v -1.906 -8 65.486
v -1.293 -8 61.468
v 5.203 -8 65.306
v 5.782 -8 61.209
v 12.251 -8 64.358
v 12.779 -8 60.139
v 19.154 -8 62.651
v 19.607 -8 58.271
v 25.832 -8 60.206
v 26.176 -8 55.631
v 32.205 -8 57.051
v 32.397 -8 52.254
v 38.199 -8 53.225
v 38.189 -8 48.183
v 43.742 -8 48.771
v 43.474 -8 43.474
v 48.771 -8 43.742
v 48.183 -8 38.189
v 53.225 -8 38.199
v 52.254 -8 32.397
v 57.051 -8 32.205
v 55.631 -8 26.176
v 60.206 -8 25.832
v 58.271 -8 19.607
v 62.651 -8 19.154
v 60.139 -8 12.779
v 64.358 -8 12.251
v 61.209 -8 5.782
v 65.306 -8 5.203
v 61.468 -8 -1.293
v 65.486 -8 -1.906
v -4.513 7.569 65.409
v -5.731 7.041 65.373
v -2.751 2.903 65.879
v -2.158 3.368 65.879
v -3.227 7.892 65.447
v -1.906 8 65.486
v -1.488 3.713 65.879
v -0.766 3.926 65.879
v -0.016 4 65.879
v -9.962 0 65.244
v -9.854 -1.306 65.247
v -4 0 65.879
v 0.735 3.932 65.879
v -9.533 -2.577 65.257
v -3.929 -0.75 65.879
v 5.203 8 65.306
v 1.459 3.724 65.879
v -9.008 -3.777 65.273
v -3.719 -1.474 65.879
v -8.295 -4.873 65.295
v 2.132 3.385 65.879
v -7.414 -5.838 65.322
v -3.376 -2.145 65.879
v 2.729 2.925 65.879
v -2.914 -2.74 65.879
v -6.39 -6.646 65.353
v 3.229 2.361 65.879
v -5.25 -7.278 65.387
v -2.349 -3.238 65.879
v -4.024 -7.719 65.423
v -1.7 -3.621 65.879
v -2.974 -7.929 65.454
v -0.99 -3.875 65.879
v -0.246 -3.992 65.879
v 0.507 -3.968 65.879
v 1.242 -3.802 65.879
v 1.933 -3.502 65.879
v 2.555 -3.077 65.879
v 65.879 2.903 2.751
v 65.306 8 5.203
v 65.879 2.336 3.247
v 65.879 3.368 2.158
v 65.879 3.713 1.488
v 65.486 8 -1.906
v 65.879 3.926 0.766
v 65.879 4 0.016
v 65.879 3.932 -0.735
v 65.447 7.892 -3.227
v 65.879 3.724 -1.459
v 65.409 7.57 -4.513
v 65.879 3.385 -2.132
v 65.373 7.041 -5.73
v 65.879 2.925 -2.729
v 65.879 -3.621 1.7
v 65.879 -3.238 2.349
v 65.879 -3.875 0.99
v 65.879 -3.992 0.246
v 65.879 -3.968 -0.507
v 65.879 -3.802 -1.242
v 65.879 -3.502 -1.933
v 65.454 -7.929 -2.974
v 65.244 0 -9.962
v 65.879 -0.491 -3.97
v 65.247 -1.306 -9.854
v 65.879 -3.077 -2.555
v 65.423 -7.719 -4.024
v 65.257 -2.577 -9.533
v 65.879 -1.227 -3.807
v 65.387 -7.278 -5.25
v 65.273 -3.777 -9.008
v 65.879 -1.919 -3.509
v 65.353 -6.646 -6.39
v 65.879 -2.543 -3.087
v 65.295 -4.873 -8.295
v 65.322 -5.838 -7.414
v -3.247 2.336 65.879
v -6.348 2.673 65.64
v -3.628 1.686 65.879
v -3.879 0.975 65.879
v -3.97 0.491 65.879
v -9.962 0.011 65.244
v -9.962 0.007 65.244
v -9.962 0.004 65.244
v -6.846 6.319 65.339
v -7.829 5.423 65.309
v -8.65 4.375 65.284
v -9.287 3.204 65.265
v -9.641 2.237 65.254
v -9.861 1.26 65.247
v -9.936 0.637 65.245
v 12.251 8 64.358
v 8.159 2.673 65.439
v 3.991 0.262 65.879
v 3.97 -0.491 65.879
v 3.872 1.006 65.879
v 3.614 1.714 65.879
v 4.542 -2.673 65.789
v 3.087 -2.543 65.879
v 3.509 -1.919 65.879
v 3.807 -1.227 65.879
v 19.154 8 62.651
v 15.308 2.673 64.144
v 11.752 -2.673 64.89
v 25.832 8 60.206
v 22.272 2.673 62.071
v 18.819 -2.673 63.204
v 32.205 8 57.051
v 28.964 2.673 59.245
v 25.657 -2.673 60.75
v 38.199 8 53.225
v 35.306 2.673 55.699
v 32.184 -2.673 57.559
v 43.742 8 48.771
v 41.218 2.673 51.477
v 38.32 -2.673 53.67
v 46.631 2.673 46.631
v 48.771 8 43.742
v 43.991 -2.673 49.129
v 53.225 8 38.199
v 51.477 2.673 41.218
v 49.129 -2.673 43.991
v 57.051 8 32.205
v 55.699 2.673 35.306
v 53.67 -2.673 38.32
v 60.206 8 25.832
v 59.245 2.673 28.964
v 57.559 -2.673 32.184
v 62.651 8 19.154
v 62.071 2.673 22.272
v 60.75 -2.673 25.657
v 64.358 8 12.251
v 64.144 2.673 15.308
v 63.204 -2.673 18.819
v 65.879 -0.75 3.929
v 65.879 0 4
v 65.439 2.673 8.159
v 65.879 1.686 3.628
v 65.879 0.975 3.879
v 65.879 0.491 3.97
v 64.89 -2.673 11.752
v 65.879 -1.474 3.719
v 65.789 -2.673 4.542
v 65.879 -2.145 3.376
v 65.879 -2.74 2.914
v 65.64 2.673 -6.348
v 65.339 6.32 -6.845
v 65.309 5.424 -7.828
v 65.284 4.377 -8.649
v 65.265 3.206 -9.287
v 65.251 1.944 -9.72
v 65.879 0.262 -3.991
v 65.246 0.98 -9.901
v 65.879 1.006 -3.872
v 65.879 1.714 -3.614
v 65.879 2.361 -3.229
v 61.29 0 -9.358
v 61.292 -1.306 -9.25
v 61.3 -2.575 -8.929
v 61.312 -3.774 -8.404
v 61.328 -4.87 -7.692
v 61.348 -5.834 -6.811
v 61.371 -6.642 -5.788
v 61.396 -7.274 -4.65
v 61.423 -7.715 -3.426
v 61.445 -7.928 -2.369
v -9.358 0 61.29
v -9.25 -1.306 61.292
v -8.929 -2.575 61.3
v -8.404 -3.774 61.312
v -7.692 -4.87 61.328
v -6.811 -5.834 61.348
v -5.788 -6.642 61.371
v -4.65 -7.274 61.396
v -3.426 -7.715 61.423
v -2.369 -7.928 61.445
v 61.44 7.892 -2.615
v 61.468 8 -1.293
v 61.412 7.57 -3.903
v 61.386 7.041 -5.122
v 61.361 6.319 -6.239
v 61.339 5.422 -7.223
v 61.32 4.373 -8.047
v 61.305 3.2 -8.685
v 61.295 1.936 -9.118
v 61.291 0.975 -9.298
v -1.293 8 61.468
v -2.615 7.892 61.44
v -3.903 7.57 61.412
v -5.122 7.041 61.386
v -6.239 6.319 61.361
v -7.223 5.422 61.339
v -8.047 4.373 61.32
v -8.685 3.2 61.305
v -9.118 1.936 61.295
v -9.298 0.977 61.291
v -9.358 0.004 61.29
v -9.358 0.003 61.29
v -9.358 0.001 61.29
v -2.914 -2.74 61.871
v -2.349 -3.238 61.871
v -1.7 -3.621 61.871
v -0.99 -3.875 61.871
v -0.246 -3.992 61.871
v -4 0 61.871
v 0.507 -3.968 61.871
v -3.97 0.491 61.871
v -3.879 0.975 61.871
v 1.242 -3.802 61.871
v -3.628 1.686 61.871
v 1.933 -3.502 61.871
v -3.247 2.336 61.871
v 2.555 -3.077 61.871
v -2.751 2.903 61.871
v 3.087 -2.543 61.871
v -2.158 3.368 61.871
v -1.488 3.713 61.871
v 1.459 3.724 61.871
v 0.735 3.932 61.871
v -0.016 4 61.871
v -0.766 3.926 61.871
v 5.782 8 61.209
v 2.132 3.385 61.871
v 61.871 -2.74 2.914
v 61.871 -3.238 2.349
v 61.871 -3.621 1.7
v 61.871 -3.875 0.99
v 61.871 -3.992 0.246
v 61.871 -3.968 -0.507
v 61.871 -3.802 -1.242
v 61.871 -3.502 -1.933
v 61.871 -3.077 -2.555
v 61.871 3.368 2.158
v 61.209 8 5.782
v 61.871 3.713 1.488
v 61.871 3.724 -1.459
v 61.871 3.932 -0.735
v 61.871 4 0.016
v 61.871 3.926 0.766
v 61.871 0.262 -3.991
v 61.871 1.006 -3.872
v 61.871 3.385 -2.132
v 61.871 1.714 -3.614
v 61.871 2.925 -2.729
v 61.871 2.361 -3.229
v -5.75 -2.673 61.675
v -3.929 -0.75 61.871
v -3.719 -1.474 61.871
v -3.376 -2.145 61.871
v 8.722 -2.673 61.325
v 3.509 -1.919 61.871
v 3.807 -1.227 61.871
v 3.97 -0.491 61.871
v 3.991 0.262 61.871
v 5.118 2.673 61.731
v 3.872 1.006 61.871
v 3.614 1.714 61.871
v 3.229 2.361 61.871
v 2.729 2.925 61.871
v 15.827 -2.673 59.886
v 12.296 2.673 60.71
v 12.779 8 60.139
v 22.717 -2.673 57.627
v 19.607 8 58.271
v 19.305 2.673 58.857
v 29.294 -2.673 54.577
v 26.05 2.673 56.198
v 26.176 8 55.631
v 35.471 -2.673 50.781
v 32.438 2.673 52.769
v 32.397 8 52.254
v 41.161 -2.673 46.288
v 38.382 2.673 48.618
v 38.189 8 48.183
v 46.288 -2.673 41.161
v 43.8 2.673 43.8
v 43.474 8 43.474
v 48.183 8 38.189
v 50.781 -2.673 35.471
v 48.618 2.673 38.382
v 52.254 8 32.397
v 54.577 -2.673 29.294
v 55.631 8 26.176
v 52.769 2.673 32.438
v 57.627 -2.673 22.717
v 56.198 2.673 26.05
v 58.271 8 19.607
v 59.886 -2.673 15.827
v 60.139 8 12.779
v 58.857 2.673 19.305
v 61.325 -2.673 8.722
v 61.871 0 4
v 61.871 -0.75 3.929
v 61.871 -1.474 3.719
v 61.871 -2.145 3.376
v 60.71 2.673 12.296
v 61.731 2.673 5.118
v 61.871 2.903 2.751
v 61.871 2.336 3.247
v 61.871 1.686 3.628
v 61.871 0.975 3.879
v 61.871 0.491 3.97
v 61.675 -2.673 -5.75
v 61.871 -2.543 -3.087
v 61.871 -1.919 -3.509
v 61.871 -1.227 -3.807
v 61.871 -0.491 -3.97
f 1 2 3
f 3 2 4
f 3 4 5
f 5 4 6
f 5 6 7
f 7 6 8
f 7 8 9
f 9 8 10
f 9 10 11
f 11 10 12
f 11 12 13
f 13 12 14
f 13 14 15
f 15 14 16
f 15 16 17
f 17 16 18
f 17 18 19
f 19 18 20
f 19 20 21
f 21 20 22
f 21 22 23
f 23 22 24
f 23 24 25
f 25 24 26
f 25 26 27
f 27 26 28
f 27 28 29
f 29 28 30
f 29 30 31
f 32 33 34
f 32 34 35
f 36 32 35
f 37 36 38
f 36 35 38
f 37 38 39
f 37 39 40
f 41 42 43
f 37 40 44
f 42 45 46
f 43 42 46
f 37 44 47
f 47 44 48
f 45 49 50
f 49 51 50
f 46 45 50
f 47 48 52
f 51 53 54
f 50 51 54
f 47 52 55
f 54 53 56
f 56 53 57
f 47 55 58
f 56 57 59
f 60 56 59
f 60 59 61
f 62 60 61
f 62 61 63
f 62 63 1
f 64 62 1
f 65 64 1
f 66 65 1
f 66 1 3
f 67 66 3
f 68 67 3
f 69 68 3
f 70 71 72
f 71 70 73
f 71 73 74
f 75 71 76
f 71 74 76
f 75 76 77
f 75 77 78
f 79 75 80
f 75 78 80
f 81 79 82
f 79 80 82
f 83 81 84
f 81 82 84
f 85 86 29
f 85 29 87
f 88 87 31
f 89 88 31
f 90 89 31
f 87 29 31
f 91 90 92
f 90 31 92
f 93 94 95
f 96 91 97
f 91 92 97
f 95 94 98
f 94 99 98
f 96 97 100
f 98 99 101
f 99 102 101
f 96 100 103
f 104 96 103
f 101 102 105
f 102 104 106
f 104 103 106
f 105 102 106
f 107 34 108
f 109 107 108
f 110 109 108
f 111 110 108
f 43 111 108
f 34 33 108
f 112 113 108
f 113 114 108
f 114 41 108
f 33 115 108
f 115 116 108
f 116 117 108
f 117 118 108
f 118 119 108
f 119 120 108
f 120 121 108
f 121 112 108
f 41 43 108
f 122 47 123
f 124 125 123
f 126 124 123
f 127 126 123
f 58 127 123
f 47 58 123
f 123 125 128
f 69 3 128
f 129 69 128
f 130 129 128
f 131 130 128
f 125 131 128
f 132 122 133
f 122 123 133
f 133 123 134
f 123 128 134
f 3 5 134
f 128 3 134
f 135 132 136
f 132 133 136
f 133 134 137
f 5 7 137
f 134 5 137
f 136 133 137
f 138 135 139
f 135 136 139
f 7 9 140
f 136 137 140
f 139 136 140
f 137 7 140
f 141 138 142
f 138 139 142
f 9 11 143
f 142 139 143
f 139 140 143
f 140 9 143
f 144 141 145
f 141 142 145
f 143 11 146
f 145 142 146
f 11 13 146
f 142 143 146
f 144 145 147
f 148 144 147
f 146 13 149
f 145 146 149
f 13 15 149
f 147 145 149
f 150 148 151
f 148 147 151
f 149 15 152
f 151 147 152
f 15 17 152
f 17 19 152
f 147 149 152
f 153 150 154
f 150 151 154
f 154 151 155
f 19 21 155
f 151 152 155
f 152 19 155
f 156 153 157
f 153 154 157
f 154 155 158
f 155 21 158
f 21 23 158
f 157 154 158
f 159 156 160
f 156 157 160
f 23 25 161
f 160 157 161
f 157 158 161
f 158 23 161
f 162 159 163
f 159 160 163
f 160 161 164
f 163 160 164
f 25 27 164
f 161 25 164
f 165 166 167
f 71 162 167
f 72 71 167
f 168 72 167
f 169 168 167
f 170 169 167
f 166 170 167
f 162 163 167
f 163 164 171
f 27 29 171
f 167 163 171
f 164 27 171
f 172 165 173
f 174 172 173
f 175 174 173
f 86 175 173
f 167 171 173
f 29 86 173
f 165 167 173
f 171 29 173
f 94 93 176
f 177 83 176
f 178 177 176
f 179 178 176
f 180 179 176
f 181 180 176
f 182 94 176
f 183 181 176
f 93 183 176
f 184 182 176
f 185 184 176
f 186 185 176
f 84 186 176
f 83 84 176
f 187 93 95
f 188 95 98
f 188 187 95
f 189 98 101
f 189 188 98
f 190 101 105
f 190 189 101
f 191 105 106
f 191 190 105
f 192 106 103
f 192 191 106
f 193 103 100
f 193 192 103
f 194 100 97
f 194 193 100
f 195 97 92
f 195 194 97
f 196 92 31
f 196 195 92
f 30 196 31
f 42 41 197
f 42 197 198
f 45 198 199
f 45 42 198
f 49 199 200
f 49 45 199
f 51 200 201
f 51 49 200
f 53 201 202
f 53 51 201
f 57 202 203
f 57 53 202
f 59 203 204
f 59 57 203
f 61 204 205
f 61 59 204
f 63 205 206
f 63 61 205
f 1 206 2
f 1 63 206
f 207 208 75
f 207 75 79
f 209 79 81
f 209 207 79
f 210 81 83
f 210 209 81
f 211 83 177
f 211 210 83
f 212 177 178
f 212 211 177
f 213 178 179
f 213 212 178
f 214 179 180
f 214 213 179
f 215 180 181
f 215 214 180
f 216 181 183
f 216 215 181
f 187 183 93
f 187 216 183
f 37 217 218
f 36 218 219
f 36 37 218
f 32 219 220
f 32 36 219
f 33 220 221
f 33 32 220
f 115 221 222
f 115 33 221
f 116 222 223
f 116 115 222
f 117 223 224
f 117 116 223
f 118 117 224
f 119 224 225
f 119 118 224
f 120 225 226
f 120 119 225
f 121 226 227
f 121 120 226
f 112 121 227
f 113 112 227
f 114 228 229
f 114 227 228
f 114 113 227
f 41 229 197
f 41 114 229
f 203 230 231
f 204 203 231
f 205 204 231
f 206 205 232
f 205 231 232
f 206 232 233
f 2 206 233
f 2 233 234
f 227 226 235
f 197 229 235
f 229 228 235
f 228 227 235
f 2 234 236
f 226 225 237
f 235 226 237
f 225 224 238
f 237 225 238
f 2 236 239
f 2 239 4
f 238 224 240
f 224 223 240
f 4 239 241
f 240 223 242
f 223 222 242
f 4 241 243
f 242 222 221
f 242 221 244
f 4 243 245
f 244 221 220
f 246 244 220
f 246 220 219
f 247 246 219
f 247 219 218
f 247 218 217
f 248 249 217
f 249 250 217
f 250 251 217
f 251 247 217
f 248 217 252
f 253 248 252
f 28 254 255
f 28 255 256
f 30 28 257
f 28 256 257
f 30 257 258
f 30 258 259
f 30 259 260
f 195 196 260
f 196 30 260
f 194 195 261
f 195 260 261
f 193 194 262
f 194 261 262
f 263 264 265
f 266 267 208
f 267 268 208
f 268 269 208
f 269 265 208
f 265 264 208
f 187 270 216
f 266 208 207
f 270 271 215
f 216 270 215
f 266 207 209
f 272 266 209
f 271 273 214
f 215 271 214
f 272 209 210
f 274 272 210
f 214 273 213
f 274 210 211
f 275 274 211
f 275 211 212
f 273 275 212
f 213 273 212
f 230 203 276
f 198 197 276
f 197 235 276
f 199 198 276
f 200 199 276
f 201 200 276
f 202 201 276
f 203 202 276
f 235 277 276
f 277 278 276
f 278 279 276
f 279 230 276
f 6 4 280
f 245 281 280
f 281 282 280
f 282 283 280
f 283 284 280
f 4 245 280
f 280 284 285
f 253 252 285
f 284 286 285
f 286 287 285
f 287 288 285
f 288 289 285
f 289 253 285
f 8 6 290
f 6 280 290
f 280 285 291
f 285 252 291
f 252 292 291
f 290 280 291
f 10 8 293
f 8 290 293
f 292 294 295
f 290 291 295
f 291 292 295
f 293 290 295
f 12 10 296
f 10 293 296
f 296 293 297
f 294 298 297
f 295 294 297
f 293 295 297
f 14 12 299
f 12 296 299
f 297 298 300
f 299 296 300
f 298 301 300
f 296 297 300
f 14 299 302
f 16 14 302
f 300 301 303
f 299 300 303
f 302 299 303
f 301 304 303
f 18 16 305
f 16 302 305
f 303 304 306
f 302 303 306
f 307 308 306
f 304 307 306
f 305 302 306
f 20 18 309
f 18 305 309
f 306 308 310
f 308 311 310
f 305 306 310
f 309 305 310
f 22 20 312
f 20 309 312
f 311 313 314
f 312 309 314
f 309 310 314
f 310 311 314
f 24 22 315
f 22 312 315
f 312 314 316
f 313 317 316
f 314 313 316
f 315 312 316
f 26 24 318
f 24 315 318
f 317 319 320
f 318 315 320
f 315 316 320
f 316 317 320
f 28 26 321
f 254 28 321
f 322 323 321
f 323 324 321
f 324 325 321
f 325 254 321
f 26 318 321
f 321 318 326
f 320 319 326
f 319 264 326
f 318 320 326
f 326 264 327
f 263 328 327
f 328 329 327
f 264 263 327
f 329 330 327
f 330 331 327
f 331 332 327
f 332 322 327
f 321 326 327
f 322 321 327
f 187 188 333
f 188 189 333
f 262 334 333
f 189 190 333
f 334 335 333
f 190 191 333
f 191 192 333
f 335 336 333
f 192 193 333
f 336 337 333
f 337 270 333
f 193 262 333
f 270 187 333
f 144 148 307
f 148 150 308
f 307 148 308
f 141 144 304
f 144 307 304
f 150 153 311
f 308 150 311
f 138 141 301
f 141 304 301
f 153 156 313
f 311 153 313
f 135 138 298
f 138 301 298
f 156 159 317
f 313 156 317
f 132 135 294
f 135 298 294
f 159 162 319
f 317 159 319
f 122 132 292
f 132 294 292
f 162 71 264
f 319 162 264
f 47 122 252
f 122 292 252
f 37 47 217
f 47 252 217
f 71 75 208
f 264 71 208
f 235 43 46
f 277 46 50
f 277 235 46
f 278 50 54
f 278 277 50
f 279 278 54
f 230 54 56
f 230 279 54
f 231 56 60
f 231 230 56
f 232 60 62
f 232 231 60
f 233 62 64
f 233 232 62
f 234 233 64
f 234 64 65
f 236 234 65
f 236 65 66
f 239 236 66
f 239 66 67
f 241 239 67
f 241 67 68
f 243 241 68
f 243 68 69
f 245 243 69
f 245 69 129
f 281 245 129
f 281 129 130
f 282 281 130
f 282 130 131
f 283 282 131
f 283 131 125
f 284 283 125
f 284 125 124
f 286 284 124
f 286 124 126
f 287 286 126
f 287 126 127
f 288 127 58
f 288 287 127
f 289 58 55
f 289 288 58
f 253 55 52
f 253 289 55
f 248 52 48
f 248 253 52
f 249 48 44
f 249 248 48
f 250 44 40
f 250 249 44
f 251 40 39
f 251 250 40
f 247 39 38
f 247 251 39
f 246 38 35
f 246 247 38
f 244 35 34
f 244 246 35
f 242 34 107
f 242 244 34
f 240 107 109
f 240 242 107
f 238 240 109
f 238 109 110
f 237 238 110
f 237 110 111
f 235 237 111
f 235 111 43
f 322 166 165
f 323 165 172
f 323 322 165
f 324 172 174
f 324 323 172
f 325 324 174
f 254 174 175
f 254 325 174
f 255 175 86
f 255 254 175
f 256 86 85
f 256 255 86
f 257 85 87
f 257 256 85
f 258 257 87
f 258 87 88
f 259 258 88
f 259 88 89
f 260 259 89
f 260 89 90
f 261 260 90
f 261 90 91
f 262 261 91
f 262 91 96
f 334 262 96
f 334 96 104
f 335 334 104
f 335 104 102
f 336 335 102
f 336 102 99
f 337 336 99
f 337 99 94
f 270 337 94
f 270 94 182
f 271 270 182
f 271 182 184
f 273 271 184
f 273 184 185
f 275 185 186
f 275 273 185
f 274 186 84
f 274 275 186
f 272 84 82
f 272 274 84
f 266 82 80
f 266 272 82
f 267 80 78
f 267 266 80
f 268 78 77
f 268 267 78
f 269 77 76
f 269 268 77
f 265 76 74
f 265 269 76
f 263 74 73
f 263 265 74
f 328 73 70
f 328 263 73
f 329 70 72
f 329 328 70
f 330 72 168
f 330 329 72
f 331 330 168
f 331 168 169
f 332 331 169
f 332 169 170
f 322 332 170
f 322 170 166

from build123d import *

# Parameters (mm, degrees)
REVOLVE_1_ANGLE           = 98.68117871
REVOLVE_1_OTHER_WAY_ANGLE = 8.68117871
SKETCH_3_R                = 4
CUT_EXTRUDE_1_DEPTH       = 94.680307429
SKETCH_4_R                = 4
CUT_EXTRUDE_2_DEPTH       = 94.59487173
FILLET_START              = -16.507933569
FILLET_1_DEPTH            = 83.507933569
FILLET_START_2            = -67
FILLET_1_2_DEPTH          = 83.255659247


with BuildPart() as part:
    # 草图2 → 旋转1 (revolve)
    with BuildSketch(Plane.XY):
        with BuildLine():
            Line((61.481704596, 8), (65.513357417, 8))
            ThreePointArc((65.513357417, 8), (66, 0), (65.513357417, -8))
            Line((65.513357417, -8), (61.481704596, -8))
            ThreePointArc((61.481704596, -8), (62, 0), (61.481704596, 8))
        make_face()
    revolve(axis=Axis((0, 0, 0), (0, -1, 0)), revolution_arc=REVOLVE_1_ANGLE)

    # 草图2 → 旋转1 other way (revolve)
    with BuildSketch(Plane.XY):
        with BuildLine():
            Line((61.481704596, 8), (65.513357417, 8))
            ThreePointArc((65.513357417, 8), (66, 0), (65.513357417, -8))
            Line((65.513357417, -8), (61.481704596, -8))
            ThreePointArc((61.481704596, -8), (62, 0), (61.481704596, 8))
        make_face()
    revolve(axis=Axis((0, 0, 0), (0, 1, 0)), revolution_arc=REVOLVE_1_OTHER_WAY_ANGLE)

    # 草图3 → 切除-拉伸1 (cut, through all)
    with BuildSketch(Plane.XY):
        with Locations(Location((0, 0, 0), (0, 0, 180))):
            Circle(SKETCH_3_R)
    extrude(amount=CUT_EXTRUDE_1_DEPTH, mode=Mode.SUBTRACT)

    # 草图4 → 切除-拉伸2 (cut, through all)
    with BuildSketch(Plane(origin=(0, 0, 0), x_dir=(0, 0, -1), z_dir=(1, 0, 0))):
        with Locations(Location((0, 0, 0), (0, 0, 180))):
            Circle(SKETCH_4_R)
    extrude(amount=CUT_EXTRUDE_2_DEPTH, mode=Mode.SUBTRACT)

    # 圆角1: read off the stored shape, not the designer's step
    # 圆角1 outline → 圆角1 (cut)
    with BuildSketch(Plane(origin=(0, 0, 0), x_dir=(0, 1, 0), z_dir=(0.9885435216678343, 0, -0.15093609829512605)).offset(FILLET_START)):
        with BuildLine():
            Line((8, 0), (8, 8))
            ThreePointArc((8, 8), (5.656854249, 2.343145751), (0, 0))
            Line((0, 0), (8, 0))
        make_face()
        with BuildLine():
            Line((-8, 0), (0, 0))
            ThreePointArc((0, 0), (-5.656854249, 2.343145751), (-8, 8))
            Line((-8, 8), (-8, 0))
        make_face()
    extrude(amount=FILLET_1_DEPTH, mode=Mode.SUBTRACT)

    # Fillet 1 2 outline → Fillet 1 2 (cut)
    with BuildSketch(Plane(origin=(0, 0, 0), x_dir=(0.9885435216678338, 0, 0.15093609829512997), z_dir=(0.15093609829512997, 0, -0.9885435216678338)).offset(FILLET_START_2)):
        with BuildLine():
            Line((0, -8), (8, -8))
            ThreePointArc((8, -8), (2.343145751, -5.656854249), (0, 0))
            Line((0, 0), (0, -8))
        make_face()
        with BuildLine():
            Line((0, 8), (0, 0))
            ThreePointArc((0, 0), (2.343145751, 5.656854249), (8, 8))
            Line((8, 8), (0, 8))
        make_face()
    extrude(amount=FILLET_1_2_DEPTH, mode=Mode.SUBTRACT)


solid = part.part
